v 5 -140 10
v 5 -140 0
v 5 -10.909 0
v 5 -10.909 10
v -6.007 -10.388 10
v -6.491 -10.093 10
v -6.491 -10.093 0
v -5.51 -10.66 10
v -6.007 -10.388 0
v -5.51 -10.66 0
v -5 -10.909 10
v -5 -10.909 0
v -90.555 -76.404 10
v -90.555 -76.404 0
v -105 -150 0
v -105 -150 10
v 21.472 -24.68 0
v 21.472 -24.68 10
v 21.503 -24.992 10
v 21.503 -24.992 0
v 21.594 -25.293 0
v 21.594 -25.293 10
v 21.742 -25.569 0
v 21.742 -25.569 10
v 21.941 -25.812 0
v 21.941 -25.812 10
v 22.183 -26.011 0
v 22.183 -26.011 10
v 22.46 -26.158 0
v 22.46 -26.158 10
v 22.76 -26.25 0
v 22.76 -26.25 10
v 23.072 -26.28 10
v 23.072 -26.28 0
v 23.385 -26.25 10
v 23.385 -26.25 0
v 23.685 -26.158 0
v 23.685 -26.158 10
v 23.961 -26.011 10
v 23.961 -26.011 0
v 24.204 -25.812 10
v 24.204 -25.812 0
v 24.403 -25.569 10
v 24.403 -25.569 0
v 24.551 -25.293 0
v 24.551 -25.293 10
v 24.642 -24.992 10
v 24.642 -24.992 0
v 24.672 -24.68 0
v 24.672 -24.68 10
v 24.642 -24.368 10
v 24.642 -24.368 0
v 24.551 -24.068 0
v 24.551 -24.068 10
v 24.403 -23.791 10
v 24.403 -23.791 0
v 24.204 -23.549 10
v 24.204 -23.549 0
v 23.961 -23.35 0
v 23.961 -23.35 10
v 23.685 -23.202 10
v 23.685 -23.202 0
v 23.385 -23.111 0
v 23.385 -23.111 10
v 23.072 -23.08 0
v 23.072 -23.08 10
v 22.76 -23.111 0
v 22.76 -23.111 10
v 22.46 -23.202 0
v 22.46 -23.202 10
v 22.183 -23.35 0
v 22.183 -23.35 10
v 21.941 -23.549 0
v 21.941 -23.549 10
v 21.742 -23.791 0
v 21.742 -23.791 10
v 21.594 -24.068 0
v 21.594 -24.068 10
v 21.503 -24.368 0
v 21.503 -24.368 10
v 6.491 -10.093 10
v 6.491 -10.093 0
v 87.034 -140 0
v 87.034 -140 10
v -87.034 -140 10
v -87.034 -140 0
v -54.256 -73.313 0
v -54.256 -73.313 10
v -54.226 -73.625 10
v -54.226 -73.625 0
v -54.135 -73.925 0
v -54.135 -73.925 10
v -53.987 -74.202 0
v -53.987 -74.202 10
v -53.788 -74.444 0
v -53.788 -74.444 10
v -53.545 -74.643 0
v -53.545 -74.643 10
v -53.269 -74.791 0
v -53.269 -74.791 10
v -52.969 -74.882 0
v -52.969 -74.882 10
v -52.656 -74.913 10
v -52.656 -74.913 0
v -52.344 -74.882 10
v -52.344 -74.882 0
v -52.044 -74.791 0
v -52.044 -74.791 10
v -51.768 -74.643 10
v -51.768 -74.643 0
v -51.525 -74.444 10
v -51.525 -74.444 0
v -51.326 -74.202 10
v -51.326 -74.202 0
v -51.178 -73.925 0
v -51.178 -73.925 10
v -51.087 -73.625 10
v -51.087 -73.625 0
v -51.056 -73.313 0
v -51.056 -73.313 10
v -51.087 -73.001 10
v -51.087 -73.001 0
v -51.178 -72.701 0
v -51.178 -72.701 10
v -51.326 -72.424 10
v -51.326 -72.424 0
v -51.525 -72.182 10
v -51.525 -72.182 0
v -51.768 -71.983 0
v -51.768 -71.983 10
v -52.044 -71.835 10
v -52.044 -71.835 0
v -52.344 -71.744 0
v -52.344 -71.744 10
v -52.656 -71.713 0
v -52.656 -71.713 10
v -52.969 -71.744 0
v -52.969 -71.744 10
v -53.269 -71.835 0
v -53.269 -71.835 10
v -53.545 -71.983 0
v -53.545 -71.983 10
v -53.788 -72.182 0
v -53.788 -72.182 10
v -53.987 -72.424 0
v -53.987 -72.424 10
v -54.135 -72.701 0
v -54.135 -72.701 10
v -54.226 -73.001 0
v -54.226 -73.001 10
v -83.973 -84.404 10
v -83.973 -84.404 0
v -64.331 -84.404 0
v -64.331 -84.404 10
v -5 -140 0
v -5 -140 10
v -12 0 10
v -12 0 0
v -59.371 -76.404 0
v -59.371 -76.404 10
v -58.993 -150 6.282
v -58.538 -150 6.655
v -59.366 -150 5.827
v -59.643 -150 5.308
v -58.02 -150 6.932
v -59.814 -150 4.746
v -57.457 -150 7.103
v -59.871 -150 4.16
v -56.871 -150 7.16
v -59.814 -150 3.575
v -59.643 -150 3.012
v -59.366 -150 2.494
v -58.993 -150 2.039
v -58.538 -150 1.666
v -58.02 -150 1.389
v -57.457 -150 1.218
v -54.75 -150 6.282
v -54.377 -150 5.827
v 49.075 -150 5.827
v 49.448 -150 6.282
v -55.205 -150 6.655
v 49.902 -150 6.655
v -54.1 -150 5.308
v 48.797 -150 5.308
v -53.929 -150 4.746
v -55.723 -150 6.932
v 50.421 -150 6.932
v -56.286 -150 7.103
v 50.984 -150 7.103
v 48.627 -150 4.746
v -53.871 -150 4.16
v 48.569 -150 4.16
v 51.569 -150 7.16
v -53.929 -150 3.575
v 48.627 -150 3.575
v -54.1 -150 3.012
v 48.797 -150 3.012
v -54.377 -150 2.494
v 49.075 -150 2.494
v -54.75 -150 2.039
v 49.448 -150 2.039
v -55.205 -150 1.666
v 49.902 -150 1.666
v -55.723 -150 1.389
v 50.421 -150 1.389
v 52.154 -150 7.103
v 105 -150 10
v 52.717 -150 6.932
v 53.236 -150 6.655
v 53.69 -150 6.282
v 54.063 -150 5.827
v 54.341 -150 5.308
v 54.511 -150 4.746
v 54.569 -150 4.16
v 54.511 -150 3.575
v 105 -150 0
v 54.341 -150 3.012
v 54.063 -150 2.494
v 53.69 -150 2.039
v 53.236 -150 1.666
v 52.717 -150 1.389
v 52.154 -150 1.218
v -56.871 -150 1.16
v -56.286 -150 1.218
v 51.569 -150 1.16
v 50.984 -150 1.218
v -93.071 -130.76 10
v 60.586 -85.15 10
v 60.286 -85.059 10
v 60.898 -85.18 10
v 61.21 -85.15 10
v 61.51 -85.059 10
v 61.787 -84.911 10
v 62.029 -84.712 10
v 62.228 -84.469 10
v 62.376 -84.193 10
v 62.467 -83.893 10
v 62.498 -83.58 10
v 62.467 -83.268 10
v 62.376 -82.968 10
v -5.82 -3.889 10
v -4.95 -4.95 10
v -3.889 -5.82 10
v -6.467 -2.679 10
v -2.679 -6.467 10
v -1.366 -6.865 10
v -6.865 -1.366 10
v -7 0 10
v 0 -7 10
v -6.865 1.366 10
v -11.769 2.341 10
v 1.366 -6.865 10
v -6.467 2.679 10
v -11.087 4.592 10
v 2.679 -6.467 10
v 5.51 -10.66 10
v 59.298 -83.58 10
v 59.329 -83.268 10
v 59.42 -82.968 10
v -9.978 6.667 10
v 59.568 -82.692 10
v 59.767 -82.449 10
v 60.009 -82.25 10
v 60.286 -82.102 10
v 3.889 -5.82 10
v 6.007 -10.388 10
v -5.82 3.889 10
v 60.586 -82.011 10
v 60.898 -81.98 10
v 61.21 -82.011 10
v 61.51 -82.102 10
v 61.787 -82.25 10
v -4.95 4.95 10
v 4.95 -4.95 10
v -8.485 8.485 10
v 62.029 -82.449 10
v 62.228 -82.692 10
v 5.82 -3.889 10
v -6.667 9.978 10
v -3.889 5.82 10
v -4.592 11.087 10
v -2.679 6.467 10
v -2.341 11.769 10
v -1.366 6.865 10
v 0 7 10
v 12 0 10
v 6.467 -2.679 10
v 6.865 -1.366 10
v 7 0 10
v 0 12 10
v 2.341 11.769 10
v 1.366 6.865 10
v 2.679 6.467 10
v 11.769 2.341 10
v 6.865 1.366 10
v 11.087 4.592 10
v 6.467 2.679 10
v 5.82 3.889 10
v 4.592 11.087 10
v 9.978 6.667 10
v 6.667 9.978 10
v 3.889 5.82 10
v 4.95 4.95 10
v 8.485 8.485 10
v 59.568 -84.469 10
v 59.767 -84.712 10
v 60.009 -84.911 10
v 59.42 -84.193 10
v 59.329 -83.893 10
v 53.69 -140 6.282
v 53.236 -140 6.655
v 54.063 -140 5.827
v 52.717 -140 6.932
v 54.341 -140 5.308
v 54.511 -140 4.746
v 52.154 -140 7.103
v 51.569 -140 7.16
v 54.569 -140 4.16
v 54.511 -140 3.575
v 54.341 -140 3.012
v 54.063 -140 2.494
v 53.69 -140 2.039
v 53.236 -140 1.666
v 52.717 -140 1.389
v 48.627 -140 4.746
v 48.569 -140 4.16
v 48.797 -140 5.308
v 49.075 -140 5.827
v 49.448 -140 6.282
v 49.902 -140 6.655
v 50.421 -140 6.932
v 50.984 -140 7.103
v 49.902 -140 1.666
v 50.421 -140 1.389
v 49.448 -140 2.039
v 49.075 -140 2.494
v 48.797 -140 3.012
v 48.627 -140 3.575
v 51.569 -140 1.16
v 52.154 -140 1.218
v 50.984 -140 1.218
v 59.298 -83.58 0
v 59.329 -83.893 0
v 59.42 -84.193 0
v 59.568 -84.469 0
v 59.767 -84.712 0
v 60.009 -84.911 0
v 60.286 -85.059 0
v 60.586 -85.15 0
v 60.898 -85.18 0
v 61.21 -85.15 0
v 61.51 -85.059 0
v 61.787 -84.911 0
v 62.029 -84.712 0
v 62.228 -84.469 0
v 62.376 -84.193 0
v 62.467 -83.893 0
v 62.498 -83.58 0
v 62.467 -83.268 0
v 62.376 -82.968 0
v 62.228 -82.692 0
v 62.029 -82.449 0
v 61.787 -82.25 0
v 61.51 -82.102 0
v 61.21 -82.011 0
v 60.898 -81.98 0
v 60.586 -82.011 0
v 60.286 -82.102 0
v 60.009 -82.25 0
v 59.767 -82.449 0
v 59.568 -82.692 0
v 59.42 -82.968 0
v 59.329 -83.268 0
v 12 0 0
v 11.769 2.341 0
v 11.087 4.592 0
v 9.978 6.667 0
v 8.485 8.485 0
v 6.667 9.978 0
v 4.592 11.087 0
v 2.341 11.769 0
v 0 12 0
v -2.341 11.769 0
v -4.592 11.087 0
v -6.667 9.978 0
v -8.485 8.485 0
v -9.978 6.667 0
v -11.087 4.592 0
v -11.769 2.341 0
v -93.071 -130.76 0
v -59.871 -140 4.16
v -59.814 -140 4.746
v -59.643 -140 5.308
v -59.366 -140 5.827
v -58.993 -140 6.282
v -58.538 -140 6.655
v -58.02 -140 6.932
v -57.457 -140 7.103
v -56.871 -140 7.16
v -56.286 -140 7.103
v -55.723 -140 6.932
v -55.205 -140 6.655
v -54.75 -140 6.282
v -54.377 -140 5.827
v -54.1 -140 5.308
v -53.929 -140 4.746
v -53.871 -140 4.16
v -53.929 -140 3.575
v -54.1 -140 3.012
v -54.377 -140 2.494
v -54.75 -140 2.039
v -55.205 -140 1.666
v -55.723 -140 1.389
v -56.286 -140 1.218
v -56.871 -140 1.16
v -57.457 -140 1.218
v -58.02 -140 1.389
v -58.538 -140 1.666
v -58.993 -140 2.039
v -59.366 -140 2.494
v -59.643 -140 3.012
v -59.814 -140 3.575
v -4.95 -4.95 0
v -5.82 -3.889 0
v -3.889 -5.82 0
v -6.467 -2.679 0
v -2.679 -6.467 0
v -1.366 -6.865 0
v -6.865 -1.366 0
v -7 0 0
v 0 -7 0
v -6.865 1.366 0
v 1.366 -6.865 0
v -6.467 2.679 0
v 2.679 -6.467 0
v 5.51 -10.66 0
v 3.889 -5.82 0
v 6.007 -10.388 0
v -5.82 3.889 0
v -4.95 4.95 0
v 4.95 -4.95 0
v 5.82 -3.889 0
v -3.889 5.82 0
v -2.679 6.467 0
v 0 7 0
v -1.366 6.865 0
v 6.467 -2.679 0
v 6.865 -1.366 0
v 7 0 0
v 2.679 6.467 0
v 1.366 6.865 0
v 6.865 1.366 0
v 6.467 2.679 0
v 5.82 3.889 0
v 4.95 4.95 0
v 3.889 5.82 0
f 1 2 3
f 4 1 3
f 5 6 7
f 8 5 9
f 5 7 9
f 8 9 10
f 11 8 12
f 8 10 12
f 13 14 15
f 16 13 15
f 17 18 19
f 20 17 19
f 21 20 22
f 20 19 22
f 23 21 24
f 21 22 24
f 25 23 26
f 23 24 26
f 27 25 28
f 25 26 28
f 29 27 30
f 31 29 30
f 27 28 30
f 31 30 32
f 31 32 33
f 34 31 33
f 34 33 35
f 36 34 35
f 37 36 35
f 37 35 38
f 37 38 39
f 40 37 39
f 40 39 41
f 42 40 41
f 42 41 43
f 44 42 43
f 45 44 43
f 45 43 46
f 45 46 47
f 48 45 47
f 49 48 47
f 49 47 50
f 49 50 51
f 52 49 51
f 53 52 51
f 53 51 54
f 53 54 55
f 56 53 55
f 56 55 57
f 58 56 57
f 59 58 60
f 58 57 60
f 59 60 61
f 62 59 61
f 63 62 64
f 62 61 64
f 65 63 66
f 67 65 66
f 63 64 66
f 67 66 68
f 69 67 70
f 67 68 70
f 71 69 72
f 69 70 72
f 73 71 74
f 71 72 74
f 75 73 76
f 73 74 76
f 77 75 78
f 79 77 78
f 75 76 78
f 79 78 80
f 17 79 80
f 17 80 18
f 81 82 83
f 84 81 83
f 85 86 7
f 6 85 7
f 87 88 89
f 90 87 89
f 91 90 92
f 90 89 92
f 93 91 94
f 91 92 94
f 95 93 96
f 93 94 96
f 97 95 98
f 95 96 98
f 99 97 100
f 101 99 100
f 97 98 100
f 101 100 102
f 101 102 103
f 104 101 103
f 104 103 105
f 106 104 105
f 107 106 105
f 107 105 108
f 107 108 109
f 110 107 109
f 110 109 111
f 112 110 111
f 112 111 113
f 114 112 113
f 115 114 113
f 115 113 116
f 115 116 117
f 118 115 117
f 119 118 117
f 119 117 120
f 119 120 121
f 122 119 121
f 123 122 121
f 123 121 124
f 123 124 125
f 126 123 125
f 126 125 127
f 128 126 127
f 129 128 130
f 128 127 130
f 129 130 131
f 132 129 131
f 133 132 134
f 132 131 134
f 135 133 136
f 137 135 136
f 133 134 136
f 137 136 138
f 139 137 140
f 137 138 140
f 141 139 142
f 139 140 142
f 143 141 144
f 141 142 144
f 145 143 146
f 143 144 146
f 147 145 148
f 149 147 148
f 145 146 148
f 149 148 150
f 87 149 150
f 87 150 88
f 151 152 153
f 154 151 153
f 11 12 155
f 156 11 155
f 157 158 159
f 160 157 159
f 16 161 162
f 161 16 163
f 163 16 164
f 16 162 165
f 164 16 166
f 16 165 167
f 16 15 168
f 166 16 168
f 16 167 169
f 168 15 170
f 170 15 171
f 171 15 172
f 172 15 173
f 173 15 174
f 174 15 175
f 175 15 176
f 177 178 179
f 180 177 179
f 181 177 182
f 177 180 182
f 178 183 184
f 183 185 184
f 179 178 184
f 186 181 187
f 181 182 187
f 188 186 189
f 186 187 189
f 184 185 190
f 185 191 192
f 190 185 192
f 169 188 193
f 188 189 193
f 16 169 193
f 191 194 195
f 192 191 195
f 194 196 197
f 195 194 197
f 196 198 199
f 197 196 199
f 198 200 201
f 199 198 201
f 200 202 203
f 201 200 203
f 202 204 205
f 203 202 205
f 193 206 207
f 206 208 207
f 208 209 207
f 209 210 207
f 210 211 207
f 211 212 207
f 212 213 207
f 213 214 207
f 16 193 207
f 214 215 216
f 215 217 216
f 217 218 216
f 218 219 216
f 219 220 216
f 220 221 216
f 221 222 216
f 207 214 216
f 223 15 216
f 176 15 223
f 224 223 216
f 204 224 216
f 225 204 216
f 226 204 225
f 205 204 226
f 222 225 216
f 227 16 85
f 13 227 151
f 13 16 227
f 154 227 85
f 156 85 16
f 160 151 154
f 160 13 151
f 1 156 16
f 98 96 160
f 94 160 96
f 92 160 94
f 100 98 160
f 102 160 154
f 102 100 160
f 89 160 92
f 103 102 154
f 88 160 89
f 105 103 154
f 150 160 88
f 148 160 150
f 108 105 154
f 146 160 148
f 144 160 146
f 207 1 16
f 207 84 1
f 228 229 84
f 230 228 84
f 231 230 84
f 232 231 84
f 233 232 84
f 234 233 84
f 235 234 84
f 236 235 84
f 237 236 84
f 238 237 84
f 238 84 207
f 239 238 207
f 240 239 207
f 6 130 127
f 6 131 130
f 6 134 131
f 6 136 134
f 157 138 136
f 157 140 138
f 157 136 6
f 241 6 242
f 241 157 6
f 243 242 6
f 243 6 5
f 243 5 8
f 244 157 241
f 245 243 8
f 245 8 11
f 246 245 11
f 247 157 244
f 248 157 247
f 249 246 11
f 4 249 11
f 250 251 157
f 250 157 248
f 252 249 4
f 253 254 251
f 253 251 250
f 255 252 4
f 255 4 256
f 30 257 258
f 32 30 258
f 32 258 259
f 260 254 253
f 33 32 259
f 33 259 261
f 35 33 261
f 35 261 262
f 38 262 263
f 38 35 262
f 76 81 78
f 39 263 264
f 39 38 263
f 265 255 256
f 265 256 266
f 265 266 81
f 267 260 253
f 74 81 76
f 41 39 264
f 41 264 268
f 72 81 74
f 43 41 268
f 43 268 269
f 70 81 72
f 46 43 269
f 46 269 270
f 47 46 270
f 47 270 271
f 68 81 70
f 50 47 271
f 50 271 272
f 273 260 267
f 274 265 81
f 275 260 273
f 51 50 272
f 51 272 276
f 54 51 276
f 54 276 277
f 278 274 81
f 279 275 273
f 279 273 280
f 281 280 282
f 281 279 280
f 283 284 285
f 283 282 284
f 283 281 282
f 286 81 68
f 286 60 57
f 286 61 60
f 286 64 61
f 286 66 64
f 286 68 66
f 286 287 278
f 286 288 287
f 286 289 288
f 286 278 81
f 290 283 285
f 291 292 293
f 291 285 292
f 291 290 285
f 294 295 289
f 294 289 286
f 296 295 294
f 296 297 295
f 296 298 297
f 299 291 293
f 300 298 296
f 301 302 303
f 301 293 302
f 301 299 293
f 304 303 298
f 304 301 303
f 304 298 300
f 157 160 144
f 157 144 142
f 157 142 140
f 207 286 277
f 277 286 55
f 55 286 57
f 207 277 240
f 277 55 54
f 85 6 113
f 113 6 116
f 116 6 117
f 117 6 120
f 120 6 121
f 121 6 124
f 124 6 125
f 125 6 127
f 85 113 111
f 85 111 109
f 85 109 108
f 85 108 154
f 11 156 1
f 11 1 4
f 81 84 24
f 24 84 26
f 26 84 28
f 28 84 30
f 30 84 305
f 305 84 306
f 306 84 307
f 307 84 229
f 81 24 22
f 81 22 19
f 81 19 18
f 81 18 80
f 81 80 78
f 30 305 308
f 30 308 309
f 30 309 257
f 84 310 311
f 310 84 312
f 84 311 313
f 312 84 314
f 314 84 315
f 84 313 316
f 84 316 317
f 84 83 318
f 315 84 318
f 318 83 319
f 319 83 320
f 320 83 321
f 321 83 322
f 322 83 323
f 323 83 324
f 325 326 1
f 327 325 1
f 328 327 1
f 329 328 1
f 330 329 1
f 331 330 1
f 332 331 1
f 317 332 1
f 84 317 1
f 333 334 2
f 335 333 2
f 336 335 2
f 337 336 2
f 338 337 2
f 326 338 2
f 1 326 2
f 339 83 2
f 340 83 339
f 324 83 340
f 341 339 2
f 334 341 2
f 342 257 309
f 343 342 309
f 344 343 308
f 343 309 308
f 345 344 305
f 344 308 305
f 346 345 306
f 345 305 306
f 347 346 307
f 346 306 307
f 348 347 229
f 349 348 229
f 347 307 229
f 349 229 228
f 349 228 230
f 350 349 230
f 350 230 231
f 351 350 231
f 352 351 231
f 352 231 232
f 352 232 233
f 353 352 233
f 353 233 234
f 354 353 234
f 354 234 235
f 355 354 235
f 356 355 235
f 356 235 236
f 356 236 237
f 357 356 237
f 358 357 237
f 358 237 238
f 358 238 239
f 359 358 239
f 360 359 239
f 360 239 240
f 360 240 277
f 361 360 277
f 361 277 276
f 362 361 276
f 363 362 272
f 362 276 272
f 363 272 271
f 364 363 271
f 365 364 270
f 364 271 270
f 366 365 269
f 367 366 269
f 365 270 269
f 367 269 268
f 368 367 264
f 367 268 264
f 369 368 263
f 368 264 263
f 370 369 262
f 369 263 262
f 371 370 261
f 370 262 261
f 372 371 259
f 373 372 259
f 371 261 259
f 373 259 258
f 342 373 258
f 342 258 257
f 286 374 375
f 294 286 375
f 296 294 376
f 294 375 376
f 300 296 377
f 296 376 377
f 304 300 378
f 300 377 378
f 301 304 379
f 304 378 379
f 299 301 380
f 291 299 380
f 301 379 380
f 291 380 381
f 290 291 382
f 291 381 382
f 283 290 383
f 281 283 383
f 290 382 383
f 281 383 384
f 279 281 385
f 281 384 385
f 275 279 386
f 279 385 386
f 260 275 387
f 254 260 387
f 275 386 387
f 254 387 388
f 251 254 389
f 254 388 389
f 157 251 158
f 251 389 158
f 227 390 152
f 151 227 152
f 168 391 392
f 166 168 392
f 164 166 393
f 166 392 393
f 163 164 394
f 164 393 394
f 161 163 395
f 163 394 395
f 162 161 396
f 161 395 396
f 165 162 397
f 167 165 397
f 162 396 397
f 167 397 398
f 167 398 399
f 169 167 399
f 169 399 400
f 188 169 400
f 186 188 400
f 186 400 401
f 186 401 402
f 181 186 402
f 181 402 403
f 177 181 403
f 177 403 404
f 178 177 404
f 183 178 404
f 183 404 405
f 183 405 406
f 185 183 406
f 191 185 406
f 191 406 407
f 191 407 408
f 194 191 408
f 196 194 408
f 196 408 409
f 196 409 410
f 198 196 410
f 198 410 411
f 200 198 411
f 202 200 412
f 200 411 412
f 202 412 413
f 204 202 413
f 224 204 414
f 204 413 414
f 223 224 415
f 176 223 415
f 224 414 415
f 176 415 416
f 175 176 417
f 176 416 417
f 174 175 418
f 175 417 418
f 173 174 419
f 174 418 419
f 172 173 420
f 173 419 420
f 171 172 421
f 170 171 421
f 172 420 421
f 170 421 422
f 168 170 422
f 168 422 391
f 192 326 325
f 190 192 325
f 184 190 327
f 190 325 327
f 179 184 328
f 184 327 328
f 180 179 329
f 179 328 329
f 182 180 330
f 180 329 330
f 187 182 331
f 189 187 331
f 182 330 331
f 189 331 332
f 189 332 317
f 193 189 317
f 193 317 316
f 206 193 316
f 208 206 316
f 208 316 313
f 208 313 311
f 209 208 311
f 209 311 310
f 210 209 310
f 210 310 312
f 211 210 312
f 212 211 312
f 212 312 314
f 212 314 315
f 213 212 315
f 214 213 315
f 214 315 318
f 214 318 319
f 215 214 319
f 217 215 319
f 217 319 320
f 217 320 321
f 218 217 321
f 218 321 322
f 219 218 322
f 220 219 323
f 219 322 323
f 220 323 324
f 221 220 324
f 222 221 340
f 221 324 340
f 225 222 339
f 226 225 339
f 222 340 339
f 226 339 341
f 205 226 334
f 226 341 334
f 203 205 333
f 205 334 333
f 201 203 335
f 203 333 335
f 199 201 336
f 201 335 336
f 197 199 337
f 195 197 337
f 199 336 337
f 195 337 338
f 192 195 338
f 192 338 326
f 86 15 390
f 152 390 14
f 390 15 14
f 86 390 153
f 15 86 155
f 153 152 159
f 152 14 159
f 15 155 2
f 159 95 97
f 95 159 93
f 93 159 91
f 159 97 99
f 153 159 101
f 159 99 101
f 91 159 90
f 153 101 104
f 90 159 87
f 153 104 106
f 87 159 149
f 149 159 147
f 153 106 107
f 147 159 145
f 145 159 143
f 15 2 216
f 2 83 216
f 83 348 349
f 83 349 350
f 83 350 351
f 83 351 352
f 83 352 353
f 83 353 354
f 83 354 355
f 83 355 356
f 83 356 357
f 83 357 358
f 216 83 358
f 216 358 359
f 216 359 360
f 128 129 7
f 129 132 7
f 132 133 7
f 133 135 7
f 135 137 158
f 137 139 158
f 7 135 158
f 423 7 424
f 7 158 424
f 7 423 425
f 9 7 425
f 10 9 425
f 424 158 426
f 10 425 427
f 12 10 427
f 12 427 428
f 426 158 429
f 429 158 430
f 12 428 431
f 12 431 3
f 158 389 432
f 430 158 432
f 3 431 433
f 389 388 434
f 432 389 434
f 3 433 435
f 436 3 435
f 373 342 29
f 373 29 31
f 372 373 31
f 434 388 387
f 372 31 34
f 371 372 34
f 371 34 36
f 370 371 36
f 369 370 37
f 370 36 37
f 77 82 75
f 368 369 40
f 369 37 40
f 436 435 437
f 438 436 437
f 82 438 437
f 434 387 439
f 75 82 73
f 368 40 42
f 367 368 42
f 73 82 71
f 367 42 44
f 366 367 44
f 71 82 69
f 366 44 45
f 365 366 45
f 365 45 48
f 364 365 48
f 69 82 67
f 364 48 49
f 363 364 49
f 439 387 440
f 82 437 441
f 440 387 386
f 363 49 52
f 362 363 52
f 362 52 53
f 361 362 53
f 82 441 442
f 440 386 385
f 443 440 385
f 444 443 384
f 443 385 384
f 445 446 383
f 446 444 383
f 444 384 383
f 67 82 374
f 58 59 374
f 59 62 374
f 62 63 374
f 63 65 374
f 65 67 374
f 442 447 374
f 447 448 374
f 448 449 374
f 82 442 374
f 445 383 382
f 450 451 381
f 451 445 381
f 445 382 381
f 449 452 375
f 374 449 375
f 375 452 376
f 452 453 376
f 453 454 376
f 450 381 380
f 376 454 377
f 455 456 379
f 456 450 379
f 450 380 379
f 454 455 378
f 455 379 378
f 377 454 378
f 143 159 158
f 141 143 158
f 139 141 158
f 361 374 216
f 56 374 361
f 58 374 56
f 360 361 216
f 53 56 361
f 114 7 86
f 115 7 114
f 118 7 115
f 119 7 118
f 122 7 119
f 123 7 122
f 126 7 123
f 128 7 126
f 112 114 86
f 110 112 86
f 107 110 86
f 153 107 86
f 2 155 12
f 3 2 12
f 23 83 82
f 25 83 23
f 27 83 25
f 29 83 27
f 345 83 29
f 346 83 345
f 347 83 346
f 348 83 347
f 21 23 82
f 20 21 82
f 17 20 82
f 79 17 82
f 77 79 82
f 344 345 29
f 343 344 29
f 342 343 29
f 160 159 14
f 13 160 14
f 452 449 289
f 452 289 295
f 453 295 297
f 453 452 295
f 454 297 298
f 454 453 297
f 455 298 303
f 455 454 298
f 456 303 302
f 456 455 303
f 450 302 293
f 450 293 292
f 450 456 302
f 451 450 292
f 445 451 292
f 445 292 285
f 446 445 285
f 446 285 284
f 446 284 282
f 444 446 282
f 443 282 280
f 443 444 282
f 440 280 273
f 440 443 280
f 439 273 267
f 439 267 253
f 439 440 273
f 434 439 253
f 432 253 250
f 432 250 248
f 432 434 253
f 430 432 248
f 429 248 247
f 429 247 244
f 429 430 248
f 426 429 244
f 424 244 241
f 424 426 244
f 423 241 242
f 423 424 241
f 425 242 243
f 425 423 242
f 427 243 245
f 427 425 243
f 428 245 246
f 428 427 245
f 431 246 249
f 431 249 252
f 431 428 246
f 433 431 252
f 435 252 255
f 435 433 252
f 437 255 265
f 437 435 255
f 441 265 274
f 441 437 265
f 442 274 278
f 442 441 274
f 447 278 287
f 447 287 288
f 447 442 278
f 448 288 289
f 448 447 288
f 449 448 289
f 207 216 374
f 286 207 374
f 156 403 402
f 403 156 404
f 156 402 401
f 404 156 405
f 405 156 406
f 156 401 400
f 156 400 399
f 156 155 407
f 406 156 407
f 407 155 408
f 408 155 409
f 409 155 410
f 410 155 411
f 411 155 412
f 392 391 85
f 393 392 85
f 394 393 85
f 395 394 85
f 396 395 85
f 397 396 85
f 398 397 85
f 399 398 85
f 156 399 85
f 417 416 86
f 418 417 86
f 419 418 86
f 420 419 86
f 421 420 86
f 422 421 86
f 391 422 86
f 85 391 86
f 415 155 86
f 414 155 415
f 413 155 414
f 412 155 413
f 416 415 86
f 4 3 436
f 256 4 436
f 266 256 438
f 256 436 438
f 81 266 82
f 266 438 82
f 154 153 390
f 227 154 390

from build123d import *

# Parameters (mm, degrees)
F0_R     = 7
F1_DEPTH = 10
F3_D     = 6
F3_DEPTH = 12
F3_TIP   = 1.8025818571
F5_D     = 3.2
F5_DEPTH = 12
F5_TIP   = 0.9613769904


with BuildPart() as f1:
    # F0 (on Top) → F1 (new body)
    with BuildSketch(Plane.XY):
        with BuildLine():
            ThreePointArc((12, 0), (0, 12), (-12, 0))
            Line((-12, 0), (-59.3705538667, -76.4041191398))
            Line((-59.3705538667, -76.4041191398), (-90.5554051491, -76.4041191398))
            Line((-90.5554051491, -76.4041191398), (-105, -150))
            Line((-105, -150), (105, -150))
            Line((105, -150), (12, 0))
        make_face()
        Polygon((-93.0711311838, -130.7598890062), (-83.972927495, -84.4041191398), (-64.3305538667, -84.4041191398), align=None, mode=Mode.SUBTRACT)
        with BuildLine():
            Line((-87.0339471359, -140), (-6.4913960666, -10.0926595656))
            ThreePointArc((-6.4913960666, -10.0926595656), (-5.7601676478, -10.527130125), (-5, -10.9087121146))
            Line((-5, -10.9087121146), (-5, -140))
            Line((-5, -140), (-87.0339471359, -140))
        make_face(mode=Mode.SUBTRACT)
        with BuildLine():
            ThreePointArc((4.9999998882, -10.9087121659), (5.7601675939, -10.5271301545), (6.4913960666, -10.0926595656))
            Line((6.4913960666, -10.0926595656), (87.0339471359, -140))
            Line((87.0339471359, -140), (4.9999998882, -140))
            Line((4.9999998882, -140), (4.9999998882, -10.9087121659))
        make_face(mode=Mode.SUBTRACT)
        Circle(F0_R, mode=Mode.SUBTRACT)
    extrude(amount=F1_DEPTH)

    # F3
    with Locations(Plane.XZ.offset(150)):
        with Locations((-56.8714849651, 4.1602337733), (51.5690222383, 4.1602337733)):
            Hole(F3_D / 2, depth=F3_DEPTH)
            with Locations((0, 0, -(F3_DEPTH + F3_TIP / 2))):  # 118° drill point
                Cone(0, F3_D / 2, F3_TIP, mode=Mode.SUBTRACT)

    # F5
    with Locations(Plane(origin=(0, 0, 0), x_dir=(1, 0, 0), z_dir=(0, 0, -1))):
        with Locations((-52.6564307511, 73.3130574226), (23.0723669739, 24.6802578412), (60.8978777595, 83.5804338496)):
            Hole(F5_D / 2, depth=F5_DEPTH)
            with Locations((0, 0, -(F5_DEPTH + F5_TIP / 2))):  # 118° drill point
                Cone(0, F5_D / 2, F5_TIP, mode=Mode.SUBTRACT)


solid = f1.part
